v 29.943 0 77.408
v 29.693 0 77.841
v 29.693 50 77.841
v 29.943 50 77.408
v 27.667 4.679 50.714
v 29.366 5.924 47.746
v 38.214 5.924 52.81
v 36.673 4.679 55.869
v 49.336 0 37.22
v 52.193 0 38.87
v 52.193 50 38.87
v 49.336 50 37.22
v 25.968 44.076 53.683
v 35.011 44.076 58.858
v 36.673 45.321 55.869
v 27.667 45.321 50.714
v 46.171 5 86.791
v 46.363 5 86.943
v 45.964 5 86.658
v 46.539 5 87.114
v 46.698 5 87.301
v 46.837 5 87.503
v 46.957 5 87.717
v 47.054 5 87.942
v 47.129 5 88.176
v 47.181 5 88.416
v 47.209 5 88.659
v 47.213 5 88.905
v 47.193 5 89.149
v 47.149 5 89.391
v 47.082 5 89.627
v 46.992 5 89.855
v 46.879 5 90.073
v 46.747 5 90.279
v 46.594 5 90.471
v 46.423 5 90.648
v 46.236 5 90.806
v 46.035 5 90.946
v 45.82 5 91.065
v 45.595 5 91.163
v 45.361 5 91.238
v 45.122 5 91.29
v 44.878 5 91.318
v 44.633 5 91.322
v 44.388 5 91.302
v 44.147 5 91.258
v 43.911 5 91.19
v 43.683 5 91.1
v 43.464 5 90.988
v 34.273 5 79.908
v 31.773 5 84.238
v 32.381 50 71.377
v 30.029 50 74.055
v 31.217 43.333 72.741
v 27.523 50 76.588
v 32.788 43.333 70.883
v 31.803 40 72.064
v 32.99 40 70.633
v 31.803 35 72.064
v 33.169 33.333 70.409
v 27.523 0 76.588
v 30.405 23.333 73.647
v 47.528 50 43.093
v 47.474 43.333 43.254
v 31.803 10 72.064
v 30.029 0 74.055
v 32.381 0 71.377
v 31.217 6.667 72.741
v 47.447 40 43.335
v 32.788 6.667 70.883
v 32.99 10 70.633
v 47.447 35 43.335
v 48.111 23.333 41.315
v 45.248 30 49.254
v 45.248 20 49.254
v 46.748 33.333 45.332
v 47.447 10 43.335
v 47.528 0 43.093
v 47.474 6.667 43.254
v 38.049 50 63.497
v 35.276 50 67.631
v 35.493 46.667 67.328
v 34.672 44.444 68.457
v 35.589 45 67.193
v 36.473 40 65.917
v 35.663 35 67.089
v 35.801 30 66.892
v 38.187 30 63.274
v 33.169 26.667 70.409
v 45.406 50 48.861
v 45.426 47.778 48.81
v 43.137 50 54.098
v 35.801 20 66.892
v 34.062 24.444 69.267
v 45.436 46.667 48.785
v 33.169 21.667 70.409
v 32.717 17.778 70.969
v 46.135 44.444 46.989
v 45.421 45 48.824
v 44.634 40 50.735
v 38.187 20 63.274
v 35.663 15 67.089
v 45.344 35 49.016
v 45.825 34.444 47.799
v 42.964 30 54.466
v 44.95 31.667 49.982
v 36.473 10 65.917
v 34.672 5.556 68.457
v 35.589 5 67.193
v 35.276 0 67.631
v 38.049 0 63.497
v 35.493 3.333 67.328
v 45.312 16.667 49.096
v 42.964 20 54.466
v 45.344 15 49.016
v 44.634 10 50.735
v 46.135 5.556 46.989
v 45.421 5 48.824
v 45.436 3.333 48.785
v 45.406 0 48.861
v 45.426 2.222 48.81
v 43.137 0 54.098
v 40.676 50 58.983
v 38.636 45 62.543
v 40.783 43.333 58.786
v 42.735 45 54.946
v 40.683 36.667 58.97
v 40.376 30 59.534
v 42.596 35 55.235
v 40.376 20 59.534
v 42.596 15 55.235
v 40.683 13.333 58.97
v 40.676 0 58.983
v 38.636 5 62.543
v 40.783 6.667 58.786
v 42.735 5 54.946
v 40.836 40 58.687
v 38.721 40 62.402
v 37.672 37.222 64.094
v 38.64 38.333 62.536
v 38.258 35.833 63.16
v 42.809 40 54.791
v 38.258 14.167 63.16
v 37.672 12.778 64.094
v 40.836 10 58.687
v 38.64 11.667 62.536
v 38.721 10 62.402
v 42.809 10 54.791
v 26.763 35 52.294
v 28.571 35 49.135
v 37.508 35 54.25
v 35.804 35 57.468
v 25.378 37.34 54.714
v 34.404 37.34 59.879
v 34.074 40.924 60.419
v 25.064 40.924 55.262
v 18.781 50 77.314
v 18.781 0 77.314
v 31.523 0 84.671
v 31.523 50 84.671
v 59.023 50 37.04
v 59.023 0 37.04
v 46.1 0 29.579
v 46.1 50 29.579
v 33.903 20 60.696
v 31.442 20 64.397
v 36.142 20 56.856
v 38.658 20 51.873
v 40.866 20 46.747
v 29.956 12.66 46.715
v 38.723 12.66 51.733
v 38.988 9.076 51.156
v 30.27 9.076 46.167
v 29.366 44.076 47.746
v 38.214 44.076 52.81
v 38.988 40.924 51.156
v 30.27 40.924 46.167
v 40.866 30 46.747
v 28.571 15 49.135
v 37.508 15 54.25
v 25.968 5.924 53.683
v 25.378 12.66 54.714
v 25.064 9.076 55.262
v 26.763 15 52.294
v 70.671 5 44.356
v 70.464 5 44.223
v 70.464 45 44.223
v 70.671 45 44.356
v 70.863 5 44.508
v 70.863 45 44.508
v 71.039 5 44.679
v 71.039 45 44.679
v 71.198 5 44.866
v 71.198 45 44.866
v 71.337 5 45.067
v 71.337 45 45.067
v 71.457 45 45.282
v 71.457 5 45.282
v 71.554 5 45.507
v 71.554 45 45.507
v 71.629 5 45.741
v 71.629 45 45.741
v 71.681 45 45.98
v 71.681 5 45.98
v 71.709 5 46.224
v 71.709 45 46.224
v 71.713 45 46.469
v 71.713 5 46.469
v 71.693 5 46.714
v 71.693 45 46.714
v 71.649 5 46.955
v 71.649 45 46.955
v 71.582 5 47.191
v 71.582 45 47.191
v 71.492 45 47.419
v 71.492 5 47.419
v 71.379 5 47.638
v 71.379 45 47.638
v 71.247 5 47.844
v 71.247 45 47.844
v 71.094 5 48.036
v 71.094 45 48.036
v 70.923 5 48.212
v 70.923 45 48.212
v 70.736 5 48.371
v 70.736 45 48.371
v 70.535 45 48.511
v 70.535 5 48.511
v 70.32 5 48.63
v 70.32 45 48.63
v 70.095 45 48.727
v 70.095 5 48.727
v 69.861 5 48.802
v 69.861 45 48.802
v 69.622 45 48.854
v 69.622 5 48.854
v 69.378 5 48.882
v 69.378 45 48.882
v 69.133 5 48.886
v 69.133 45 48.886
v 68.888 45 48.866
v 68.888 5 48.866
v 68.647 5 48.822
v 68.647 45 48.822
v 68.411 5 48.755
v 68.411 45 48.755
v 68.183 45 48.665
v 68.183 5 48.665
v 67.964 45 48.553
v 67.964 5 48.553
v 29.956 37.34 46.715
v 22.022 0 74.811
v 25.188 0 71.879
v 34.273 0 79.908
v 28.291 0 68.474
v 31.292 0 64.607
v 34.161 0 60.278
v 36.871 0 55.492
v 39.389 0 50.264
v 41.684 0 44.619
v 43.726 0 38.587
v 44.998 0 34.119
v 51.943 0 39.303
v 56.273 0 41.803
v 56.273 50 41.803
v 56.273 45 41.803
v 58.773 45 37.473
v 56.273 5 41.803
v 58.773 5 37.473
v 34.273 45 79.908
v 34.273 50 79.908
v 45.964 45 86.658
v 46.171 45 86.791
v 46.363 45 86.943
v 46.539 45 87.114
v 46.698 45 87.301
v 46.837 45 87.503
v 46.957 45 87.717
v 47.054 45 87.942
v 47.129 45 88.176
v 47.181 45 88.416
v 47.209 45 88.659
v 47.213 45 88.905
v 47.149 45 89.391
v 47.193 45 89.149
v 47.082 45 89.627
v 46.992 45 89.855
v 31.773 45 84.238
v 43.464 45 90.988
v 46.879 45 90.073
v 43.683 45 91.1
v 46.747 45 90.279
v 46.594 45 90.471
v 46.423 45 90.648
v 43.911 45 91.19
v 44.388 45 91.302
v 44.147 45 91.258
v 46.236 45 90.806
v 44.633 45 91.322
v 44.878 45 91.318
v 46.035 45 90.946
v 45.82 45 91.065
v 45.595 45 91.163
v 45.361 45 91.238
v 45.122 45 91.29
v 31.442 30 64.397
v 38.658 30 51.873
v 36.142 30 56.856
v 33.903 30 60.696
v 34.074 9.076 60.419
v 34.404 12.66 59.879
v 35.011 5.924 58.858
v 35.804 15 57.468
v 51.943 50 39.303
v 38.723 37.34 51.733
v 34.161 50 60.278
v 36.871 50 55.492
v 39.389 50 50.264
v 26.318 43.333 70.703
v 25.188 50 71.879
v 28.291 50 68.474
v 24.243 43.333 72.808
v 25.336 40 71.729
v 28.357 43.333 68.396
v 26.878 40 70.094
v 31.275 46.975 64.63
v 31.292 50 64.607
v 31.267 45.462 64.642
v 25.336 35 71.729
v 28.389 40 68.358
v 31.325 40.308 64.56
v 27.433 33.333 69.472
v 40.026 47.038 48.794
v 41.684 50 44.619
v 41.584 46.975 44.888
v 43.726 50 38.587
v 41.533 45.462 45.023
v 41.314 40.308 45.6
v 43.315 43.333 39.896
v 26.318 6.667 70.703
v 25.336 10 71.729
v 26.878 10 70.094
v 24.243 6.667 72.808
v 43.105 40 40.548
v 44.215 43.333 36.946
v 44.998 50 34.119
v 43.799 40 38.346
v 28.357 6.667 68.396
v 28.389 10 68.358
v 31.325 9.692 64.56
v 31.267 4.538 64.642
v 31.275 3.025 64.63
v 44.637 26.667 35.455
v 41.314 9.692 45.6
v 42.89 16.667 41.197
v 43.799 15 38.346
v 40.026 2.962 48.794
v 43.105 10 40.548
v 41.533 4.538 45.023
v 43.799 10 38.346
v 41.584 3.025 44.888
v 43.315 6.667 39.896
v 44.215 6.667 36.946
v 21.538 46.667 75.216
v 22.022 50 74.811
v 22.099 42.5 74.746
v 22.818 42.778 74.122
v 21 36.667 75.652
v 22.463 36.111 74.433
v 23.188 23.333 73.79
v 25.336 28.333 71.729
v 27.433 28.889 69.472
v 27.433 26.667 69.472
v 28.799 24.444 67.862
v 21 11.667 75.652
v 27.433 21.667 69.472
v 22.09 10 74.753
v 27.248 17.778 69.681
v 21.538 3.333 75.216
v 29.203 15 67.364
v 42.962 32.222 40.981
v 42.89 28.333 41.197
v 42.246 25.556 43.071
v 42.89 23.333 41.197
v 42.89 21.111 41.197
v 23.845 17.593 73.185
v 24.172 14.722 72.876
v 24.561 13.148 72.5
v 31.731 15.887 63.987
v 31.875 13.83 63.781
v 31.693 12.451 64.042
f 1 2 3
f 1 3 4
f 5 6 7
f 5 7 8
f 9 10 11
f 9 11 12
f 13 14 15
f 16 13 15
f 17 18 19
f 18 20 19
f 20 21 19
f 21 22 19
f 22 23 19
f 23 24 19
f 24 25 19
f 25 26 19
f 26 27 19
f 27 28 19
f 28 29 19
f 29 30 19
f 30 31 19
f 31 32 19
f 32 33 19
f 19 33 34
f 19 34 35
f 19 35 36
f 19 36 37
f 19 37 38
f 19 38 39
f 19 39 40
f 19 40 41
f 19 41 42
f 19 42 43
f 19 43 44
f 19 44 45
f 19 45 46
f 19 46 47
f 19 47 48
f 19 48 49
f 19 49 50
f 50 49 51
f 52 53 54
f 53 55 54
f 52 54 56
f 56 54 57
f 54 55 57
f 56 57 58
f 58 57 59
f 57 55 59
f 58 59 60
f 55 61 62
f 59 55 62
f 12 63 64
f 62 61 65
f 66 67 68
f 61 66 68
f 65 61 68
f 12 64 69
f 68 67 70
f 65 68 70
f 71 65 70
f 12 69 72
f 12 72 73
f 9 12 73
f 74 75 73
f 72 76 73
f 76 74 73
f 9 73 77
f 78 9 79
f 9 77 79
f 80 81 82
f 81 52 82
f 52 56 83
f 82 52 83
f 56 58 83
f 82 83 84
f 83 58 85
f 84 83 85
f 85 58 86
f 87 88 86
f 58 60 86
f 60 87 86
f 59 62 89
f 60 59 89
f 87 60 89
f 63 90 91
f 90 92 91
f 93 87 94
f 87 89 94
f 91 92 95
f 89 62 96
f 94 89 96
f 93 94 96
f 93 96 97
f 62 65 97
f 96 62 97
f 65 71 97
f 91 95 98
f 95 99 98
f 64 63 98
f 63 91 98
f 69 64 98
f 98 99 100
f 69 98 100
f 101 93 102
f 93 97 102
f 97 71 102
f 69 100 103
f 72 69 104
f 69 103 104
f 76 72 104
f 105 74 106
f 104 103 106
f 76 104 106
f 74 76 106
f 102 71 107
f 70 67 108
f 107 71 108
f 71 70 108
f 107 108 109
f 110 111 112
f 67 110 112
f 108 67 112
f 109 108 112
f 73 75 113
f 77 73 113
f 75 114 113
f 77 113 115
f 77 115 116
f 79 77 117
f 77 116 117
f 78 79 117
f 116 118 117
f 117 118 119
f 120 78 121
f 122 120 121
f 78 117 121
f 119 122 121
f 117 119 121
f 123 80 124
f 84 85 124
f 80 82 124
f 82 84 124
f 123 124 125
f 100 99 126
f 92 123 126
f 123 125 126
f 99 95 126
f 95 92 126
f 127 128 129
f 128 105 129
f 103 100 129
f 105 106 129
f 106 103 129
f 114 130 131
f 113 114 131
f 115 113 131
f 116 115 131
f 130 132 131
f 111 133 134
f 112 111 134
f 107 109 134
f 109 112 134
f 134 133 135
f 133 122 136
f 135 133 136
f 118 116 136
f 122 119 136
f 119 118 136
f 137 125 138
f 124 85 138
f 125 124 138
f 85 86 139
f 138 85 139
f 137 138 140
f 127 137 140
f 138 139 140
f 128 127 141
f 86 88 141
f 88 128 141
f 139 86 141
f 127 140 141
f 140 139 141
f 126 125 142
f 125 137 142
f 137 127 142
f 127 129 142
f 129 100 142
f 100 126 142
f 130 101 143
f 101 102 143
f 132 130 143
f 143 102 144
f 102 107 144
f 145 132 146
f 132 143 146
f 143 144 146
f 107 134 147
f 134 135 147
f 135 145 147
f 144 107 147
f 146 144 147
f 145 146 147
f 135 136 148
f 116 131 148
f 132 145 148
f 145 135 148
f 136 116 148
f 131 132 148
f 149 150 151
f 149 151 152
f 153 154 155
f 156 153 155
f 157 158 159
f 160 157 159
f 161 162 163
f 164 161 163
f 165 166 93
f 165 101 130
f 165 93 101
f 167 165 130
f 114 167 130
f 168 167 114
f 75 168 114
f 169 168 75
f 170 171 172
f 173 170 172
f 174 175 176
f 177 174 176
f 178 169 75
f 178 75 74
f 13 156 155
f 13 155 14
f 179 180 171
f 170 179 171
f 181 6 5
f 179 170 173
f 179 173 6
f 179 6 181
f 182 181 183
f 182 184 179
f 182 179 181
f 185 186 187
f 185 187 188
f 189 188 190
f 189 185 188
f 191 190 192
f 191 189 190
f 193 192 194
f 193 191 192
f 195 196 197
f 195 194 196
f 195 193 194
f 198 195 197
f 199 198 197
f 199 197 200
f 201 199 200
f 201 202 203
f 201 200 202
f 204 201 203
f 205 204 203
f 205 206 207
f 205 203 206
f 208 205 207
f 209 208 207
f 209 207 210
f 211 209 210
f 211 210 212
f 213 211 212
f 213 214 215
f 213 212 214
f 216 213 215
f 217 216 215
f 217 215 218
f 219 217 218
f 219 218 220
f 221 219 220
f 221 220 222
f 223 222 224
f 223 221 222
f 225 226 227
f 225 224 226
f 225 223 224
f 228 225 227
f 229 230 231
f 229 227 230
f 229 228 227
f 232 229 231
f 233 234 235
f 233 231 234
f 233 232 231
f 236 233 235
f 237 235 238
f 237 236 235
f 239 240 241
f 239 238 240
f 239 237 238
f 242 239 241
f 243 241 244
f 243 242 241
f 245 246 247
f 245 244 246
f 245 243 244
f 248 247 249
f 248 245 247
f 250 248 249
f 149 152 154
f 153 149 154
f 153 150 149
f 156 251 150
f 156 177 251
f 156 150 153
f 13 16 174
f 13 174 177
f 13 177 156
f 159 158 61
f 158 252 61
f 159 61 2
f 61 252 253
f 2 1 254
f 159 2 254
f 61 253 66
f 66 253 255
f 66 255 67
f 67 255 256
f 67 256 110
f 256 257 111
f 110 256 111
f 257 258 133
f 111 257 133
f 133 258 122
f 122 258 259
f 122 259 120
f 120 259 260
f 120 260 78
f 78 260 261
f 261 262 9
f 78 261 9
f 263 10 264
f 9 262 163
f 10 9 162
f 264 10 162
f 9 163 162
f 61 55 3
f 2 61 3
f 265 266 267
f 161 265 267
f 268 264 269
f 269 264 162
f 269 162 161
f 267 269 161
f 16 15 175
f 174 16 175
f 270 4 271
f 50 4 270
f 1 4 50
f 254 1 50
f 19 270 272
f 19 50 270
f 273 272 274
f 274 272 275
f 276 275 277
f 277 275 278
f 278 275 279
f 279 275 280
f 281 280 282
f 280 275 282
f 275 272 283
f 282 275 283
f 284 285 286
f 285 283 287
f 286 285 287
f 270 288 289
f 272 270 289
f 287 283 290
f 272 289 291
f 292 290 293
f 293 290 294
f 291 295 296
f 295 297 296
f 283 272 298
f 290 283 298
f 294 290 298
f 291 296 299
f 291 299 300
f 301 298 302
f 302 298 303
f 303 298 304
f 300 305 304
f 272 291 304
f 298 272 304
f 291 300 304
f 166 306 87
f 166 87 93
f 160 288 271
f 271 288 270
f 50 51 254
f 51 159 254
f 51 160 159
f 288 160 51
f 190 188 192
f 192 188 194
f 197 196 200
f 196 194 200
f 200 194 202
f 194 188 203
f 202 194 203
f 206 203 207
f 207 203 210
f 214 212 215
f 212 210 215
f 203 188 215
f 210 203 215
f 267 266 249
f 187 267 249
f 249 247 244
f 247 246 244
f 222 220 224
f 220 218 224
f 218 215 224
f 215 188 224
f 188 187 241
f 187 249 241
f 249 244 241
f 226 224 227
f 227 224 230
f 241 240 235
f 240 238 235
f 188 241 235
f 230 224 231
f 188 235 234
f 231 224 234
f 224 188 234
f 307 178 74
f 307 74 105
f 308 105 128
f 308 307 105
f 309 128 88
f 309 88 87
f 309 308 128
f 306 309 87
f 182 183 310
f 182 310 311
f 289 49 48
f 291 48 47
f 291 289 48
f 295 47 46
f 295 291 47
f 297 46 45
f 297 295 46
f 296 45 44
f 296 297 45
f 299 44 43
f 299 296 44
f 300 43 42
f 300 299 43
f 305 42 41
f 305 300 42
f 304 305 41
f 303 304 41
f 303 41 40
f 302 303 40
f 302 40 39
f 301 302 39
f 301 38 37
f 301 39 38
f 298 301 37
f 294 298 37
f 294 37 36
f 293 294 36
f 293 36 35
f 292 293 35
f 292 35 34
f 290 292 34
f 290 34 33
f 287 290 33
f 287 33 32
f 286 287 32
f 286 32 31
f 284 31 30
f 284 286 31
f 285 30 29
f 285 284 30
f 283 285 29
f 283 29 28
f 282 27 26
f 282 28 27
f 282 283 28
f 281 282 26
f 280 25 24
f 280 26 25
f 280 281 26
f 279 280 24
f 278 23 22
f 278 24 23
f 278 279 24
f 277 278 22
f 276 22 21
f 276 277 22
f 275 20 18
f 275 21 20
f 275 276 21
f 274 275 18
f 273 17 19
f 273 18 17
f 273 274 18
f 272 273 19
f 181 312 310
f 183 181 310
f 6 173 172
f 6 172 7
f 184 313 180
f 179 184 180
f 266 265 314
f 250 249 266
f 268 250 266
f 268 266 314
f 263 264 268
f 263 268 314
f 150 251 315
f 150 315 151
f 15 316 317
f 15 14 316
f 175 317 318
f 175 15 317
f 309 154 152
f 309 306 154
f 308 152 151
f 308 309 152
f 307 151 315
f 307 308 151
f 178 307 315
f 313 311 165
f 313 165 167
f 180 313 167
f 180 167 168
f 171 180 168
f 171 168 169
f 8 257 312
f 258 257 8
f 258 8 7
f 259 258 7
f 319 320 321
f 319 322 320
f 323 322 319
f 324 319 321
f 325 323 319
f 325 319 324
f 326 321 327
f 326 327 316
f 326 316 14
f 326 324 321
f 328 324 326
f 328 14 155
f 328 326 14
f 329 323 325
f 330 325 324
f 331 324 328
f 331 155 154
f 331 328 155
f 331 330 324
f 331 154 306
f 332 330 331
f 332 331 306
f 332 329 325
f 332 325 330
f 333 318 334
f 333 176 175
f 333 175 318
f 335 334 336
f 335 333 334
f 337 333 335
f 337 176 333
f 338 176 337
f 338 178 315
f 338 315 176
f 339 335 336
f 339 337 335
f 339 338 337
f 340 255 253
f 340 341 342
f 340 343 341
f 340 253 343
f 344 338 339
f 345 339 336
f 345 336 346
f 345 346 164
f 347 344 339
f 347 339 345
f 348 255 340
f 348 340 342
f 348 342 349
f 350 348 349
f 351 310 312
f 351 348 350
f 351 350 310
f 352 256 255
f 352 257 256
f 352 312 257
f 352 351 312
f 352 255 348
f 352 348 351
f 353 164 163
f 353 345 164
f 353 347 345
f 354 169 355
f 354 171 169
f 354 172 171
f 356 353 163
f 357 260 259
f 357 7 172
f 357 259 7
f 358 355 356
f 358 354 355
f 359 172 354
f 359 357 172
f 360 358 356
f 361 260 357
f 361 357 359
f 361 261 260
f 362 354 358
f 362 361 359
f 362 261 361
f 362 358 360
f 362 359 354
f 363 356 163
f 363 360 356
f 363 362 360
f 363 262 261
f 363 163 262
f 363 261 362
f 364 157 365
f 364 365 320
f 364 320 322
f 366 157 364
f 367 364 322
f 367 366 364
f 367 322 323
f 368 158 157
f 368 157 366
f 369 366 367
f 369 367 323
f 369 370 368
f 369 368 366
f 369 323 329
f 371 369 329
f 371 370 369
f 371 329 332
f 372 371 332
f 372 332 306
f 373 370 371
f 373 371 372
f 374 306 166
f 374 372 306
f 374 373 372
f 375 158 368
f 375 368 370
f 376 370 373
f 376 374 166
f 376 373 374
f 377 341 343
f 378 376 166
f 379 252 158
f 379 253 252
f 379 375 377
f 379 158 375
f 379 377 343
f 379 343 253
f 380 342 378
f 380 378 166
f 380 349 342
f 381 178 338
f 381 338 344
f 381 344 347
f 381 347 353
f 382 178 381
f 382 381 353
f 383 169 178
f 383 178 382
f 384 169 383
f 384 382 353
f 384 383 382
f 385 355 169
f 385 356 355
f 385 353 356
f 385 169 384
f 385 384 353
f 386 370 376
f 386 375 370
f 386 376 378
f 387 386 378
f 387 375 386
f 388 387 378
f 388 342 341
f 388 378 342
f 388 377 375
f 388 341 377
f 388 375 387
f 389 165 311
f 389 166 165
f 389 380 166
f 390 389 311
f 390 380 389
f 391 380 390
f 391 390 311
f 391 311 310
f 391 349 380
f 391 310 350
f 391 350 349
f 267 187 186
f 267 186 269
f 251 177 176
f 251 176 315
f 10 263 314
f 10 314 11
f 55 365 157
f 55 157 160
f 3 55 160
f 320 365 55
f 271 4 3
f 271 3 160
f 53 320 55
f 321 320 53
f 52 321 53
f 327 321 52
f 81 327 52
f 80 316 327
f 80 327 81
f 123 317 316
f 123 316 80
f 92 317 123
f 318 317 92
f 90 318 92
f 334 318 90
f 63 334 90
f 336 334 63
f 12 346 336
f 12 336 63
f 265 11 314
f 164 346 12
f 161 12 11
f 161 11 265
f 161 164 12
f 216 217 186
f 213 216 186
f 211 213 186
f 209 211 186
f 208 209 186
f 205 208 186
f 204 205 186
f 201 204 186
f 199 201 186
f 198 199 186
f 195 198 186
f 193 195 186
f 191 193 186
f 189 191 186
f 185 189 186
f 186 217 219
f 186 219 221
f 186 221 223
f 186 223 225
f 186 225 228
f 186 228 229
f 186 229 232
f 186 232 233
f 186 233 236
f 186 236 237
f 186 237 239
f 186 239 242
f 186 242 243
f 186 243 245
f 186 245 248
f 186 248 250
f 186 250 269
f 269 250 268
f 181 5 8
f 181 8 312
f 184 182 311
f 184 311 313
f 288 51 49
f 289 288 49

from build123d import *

# Parameters (mm, degrees)
BOSS_EXTRUDE1_DEPTH      = 50
SHELL1_T                 = -5
BOSS_EXTRUDE2_DEPTH      = 5.500000000000001
BOSS_EXTRUDE2_DEPTH_BACK = 7.5
CUT_EXTRUDE1_DEPTH       = 10
SKETCH5_W                = 16
SKETCH5_H                = 5
CUT_EXTRUDE2_DEPTH       = 121.69448930041943
FILLET2_RADIUS           = 2.5
FILLET2_LENGTH           = 40
FILLET3_RADIUS           = 2.5
FILLET3_LENGTH           = 40


with BuildPart() as part:
    # Sketch2 → Boss-Extrude1 (new body)
    with BuildSketch(Plane(origin=(0, 0, 0), x_dir=(1, 0, 0), z_dir=(0, 1, 0))):
        with BuildLine():
            Line((18.78053977456615, -77.31409286467196), (23.042995642351375, -79.77502290734665))
            Line((23.042995642351375, -79.77502290734665), (31.523043656078794, -84.67098091081314))
            Line((31.523043656078794, -84.67098091081314), (31.773043656078798, -84.23796820892092))
            Line((31.773043656078798, -84.23796820892092), (45.62945011662982, -92.23796820892092))
            Line((45.62945011662982, -92.23796820892092), (72.62945011662983, -45.4725964045612))
            Line((72.62945011662983, -45.4725964045612), (58.773043656078805, -37.472596404561216))
            Line((58.773043656078805, -37.472596404561216), (59.0230436560788, -37.039583702669006))
            Line((59.0230436560788, -37.039583702669006), (50.362789618234416, -32.03958370266901))
            Line((50.362789618234416, -32.03958370266901), (46.10033375044919, -29.578653659994334))
            add(Edge.make_bspline(
                [(18.78053977456615, -77.31409286467196), (38.540581097928744, -63.49650278099066), (46.10033375044919, -29.578653659994334)],
                knots=[3.5325222979989195, 3.5325222979989195, 3.5325222979989195, 4.350849853477907, 4.350849853477907, 4.350849853477907], degree=2, weights=[1, 0.9174538281146124, 1]))
        make_face()
    extrude(amount=BOSS_EXTRUDE1_DEPTH)

    # Shell1
    shell1_openings = [part.faces().sort_by_distance(p)[0] for p in [
        (47.213884273, 50, 61.782899624),
        (47.213884273, 0, 61.782899624),
        (59.129450117, 25, 68.855282307),
    ]]
    offset(amount=SHELL1_T, openings=shell1_openings, kind=Kind.INTERSECTION)

    # Sketch3 → Boss-Extrude2 (add, two sides: drawn at the far end of the back side and taken through both)
    with BuildSketch(Plane(origin=(47.47757848615084, 0, 27.172215953725974), x_dir=(-0.4967199718961618, 0, 0.8679108649622244), z_dir=(-0.8679108649622244, 0, -0.4967199718961618)).offset(-BOSS_EXTRUDE2_DEPTH_BACK)):
        Polygon((25.664850284699074, 37.339555568810255), (28.453024038902463, 35.000000000000014), (32.09272638156445, 35.000000000000014), (34.8809001357678, 37.339555568810226), (35.51292781482111, 40.92396265452046), (33.69307664349011, 44.07603734547951), (30.272875210233437, 45.320888862379554), (26.852673776976776, 44.07603734547953), (25.03282260564577, 40.923962654520494), align=None)
        Polygon((33.69307664349011, 5.923962654520468), (35.51292781482114, 9.07603734547954), (34.880900135767824, 12.660444431189784), (32.09272638156446, 15.000000000000004), (28.453024038902413, 15.000000000000004), (25.664850284699046, 12.660444431189786), (25.032822605645727, 9.07603734547953), (26.852673776976744, 5.9239626545204755), (30.272875210233433, 4.679111137620436), align=None)
    extrude(amount=BOSS_EXTRUDE2_DEPTH + BOSS_EXTRUDE2_DEPTH_BACK)

    # Sketch4 → Cut-Extrude1 (cut)
    with BuildSketch(Plane(origin=(47.47757848615084, 0, 27.172215953725974), x_dir=(-0.4967199718961618, 0, 0.8679108649622244), z_dir=(-0.8679108649622244, 0, -0.4967199718961618))):
        Polygon((40.272875210233444, 19.999999999999996), (20.27287521023344, 19.999999999999993), (20.27287521023344, 30), (40.272875210233444, 30.000000000000007), align=None)
    extrude(amount=-CUT_EXTRUDE1_DEPTH, mode=Mode.SUBTRACT)

    # Sketch5 → Cut-Extrude2 (cut, through all)
    with BuildSketch(Plane(origin=(-28.532849302036027, 0, 49.420344675832624), x_dir=(0.8660254037844389, 0, 0.49999999999999967), z_dir=(-0.49999999999999967, 0, 0.8660254037844389))):
        with Locations((77.63524706617667, 47.50000000000001)):
            Rectangle(SKETCH5_W, SKETCH5_H)
        Polygon((69.63524706617666, 0), (85.63524706617667, 0), (85.63524706617667, 5), (69.63524706617667, 4.999999999999997), align=None)
    extrude(amount=-CUT_EXTRUDE2_DEPTH, mode=Mode.SUBTRACT)

    # Fillet2: full round fillet: the end face becomes a half cylinder, R = half its width
    fillet2_face = Plane((46.879450117, 25, 90.072904699), x_dir=(0, 1, 0), z_dir=(0.866025403784, 0, 0.5))  # on the end face: x along it, z out of the body
    fillet2_slab = fillet2_face.offset(-FILLET2_RADIUS / 2) * Box(FILLET2_LENGTH, 2 * FILLET2_RADIUS, FILLET2_RADIUS, mode=Mode.PRIVATE)  # the body's end, R deep
    fillet2_round = Plane((44.71438660754, 25, 88.822904699), x_dir=(0.866025403784, 0, 0.5), z_dir=(0, 1, 0)) * Cylinder(FILLET2_RADIUS, FILLET2_LENGTH, mode=Mode.PRIVATE)  # its axis R under the face
    add(fillet2_slab - fillet2_round, mode=Mode.SUBTRACT)

    # Fillet3: full round fillet: the end face becomes a half cylinder, R = half its width
    fillet3_face = Plane((71.379450117, 25, 47.637659914), x_dir=(0, -1, 0), z_dir=(0.866025403784, 0, 0.5))  # on the end face: x along it, z out of the body
    fillet3_slab = fillet3_face.offset(-FILLET3_RADIUS / 2) * Box(FILLET3_LENGTH, 2 * FILLET3_RADIUS, FILLET3_RADIUS, mode=Mode.PRIVATE)  # the body's end, R deep
    fillet3_round = Plane((69.21438660754, 25, 46.387659914), x_dir=(0.866025403784, 0, 0.5), z_dir=(0, -1, 0)) * Cylinder(FILLET3_RADIUS, FILLET3_LENGTH, mode=Mode.PRIVATE)  # its axis R under the face
    add(fillet3_slab - fillet3_round, mode=Mode.SUBTRACT)


solid = part.part
